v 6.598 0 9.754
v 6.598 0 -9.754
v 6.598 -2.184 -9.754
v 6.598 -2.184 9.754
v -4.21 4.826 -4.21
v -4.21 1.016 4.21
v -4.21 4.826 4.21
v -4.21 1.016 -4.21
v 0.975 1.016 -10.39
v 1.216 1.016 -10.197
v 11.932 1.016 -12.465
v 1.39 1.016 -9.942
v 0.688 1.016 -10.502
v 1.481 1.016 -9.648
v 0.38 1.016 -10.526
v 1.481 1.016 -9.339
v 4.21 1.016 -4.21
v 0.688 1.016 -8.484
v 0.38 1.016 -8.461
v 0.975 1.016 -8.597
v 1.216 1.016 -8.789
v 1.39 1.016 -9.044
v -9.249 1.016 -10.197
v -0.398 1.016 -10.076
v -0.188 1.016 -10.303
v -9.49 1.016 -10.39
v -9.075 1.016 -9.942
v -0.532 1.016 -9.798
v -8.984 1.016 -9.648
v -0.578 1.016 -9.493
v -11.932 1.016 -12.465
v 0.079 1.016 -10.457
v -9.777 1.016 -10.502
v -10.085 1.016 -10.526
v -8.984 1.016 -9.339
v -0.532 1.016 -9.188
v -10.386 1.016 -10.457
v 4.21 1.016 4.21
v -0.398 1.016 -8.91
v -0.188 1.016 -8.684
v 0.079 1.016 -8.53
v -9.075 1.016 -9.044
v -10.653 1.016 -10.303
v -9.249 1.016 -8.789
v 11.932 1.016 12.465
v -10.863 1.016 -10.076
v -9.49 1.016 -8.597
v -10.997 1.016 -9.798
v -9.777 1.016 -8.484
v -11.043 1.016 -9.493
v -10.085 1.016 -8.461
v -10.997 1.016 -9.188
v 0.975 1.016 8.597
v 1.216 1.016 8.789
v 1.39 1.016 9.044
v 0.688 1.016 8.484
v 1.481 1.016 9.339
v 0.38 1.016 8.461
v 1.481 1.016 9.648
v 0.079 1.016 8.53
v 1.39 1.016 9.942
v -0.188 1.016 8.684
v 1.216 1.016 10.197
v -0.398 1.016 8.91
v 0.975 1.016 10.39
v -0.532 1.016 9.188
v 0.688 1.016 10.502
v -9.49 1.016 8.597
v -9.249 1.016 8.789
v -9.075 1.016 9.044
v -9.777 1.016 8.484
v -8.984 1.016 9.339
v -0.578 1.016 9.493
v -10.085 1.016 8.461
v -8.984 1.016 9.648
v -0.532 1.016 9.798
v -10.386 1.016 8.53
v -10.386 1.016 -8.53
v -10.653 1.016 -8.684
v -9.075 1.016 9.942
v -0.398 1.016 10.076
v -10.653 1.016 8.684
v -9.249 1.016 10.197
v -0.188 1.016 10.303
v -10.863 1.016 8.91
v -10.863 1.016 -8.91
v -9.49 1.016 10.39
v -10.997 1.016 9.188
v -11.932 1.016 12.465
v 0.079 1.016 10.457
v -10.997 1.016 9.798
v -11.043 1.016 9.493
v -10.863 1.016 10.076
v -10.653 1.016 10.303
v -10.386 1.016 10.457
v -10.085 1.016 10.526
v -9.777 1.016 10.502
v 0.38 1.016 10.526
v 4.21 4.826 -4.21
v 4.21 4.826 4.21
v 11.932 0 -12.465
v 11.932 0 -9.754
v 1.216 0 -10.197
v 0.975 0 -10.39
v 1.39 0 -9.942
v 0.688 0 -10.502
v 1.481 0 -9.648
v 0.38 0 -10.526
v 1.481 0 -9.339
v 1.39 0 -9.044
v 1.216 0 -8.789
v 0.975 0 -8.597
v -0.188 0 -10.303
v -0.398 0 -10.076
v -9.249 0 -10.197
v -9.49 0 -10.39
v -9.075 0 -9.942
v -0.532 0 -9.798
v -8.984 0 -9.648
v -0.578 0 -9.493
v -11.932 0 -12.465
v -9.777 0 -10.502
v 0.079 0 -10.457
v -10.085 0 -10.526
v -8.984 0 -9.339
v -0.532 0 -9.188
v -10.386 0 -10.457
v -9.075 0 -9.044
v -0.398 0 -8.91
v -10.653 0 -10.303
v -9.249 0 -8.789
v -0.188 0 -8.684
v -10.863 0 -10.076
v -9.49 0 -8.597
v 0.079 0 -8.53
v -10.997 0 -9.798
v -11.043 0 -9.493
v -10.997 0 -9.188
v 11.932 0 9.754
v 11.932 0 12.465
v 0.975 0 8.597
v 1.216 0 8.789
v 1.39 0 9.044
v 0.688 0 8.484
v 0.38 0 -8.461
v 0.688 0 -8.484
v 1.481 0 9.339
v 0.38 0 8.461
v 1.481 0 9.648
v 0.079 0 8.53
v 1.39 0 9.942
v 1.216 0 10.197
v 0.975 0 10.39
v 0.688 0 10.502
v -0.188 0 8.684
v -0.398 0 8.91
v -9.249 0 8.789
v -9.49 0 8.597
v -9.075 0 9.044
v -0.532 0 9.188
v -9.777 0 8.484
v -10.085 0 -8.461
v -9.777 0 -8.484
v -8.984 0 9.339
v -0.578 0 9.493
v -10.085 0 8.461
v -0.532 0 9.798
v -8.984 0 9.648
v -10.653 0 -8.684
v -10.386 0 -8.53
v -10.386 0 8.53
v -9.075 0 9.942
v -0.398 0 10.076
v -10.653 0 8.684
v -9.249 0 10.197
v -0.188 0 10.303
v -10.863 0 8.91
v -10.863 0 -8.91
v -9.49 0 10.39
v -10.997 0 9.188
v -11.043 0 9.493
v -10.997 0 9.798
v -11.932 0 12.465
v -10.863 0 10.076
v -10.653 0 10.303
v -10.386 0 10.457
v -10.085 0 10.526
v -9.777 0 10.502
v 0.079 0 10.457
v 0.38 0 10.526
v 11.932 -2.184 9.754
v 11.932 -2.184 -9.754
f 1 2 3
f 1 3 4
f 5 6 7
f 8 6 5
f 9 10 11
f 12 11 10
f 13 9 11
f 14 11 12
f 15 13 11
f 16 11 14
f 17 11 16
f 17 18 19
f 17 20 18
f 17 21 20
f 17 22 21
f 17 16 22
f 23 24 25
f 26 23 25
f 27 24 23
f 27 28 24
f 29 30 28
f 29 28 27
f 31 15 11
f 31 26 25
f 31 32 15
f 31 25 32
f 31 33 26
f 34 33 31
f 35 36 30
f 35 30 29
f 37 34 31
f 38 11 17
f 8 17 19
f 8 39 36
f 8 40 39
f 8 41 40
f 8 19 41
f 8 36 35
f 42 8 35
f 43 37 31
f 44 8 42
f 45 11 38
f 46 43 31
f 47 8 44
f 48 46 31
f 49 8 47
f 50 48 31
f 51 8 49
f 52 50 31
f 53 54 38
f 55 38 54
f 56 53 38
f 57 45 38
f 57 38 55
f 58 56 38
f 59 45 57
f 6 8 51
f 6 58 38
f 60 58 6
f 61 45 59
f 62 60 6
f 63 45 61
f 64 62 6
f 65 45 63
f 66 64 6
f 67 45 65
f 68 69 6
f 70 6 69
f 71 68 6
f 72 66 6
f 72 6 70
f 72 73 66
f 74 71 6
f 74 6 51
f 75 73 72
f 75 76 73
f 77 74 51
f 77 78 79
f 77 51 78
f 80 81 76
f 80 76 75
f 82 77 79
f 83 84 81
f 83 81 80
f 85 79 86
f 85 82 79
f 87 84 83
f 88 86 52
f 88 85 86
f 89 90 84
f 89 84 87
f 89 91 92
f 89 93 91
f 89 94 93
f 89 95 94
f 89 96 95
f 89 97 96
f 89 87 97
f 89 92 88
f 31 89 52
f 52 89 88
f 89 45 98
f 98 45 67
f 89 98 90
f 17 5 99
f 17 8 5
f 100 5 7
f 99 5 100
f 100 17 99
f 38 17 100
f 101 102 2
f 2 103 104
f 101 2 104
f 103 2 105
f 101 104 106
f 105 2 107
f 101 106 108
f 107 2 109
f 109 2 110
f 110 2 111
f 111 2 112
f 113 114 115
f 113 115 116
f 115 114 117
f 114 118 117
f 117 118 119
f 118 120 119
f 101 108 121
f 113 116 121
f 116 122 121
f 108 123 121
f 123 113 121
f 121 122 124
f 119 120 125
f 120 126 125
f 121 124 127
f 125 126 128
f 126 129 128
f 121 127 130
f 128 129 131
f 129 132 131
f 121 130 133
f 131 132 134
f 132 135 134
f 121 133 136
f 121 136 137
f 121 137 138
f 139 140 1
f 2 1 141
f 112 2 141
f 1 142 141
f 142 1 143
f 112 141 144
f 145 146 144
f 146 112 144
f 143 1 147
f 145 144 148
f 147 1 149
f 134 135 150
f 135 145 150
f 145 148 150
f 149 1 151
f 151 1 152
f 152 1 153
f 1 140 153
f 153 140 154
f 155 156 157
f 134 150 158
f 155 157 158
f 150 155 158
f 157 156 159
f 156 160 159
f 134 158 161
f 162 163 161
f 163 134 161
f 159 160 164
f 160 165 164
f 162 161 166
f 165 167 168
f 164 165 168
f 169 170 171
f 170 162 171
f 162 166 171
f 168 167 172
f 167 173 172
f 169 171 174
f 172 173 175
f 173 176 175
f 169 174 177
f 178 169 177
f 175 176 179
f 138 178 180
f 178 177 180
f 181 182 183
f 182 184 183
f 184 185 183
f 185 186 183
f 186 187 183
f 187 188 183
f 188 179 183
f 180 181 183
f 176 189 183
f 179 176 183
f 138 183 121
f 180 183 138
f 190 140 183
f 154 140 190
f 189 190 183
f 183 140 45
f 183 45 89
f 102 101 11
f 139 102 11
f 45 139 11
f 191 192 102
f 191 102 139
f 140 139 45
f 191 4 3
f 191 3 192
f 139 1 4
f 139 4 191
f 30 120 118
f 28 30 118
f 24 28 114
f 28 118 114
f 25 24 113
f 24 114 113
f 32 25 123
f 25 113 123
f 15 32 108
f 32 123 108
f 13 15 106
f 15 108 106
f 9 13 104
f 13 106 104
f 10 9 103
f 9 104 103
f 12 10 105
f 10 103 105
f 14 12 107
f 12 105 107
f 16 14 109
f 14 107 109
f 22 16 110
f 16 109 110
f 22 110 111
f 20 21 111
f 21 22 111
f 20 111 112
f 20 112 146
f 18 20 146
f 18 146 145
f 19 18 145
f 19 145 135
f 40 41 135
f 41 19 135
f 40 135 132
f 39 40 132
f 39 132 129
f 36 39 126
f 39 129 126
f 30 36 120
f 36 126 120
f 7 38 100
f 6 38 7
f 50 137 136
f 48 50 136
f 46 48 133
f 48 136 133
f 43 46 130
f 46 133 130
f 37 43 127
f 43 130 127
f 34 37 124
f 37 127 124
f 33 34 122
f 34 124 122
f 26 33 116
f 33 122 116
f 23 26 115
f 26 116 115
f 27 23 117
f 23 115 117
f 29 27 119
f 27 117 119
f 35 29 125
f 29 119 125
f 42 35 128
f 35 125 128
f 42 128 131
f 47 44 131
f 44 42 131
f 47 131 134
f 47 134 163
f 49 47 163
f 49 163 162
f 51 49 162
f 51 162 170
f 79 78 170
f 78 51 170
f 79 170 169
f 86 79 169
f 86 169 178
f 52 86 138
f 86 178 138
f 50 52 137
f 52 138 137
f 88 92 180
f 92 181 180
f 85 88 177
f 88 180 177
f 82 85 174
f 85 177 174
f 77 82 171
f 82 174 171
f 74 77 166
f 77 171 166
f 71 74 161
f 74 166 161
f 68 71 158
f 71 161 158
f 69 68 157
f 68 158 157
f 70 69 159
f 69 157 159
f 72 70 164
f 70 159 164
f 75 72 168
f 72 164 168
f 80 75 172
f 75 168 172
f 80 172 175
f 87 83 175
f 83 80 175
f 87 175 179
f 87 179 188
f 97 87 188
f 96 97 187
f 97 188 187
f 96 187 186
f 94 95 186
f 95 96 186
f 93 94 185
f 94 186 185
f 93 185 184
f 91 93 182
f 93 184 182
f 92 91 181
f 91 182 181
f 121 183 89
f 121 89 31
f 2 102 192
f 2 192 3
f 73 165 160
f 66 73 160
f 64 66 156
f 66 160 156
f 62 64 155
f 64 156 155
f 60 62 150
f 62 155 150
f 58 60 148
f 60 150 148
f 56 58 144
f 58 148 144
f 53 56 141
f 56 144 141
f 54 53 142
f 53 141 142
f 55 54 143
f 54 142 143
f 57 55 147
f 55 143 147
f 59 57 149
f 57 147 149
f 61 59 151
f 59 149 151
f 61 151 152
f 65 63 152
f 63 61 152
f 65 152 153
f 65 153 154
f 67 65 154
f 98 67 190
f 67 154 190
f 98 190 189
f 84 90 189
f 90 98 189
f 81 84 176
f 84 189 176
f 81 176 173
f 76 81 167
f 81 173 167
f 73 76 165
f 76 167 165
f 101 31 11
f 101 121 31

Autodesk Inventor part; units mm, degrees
ref_plane "YZ Plane" through (0, 0, 0) normal (1, 0, 0) x (0, 1, 0)
ref_plane "XZ Plane" through (0, 0, 0) normal (0, 1, 0) x (-1, 0, 0)
ref_plane "XY Plane" through (0, 0, 0) normal (0, 0, 1) x (1, 0, 0)
sketch "Sketch1" plane through (0, 0, 0) normal (0, 1, 0) x (-1, 0, 0)
  line L0 (-11.9316, 12.465) -> (11.9317, 12.465)
  line L1 (11.9317, 12.465) -> (11.9316, -12.465)
  line L2 (11.9316, -12.465) -> (-11.9317, -12.465)
  line L3 (-11.9317, -12.465) -> (-11.9316, 12.465)
  line L4 (-11.9316, 12.465) -> (11.9316, -12.465) construction
  line L5 (11.9317, 12.465) -> (-11.9317, -12.465) construction
  circle A0 centre (10.0076, 9.4933) radius 1.0351
  line L6 (0, 0) -> (10.0076, 0) construction
  line L7 (10.0076, 0) -> (10.0076, 9.4933) construction
  line L8 (4.7752, 0) -> (4.7752, 3.1605) construction
  circle A1 centre (10.0076, -9.4933) radius 1.0351
  circle A2 centre (-0.4572, 9.4933) radius 1.0351
  circle A3 centre (-0.4572, -9.4933) radius 1.0351
  dimension "d0" = 24.9301
  dimension "d1" = 23.8633
  dimension "d2" = 2.0701
  dimension "d3" = 1.9241
  dimension "d5" = 5.2324
  dimension "d16" = 18.9865
extrude "Extrusion1" add sketch "Sketch1" along normal blind 1.016
sketch "Sketch2" plane through (0, 1.016, 0) normal (0, 1, 0) x (1, 0, 0)
  line L0 (4.2101, -4.21) -> (-4.21, -4.21)
  line L1 (-4.21, -4.21) -> (-4.21, 4.21)
  line L2 (-4.21, 4.21) -> (4.2101, 4.2101)
  line L3 (4.2101, 4.2101) -> (4.2101, -4.21)
  line L4 (4.2101, -4.21) -> (-4.21, 4.21) construction
  line L5 (-4.21, -4.21) -> (4.2101, 4.2101) construction
  point P0 (0, 0)
  dimension "d8" = 8.4201
  dimension "d9" = 8.4201
extrude "Extrusion2" add sketch "Sketch2" along normal blind 3.81
sketch "Sketch3" plane through (0, 0, 0) normal (0, -1, 0) x (1, 0, 0)
  line L0 (11.9316, 12.465) -> (11.9317, -12.465) projected
  line L1 (6.5977, 9.7536) -> (11.9317, 9.7536)
  line L2 (11.9317, 9.7536) -> (11.9317, -9.7536)
  line L3 (11.9317, -9.7536) -> (6.5977, -9.7536)
  line L4 (6.5977, -9.7536) -> (6.5977, 9.7536)
  line L5 (6.5977, 9.7536) -> (11.9317, -9.7536) construction
  line L6 (11.9317, 9.7536) -> (6.5977, -9.7536) construction
  line L7 (0, 0) -> (9.2647, 0) construction
  dimension "d12" = 5.334
  dimension "d13" = 19.5072
extrude "Extrusion3" add sketch "Sketch3" along normal blind 2.1844
properties part number "Camera"
